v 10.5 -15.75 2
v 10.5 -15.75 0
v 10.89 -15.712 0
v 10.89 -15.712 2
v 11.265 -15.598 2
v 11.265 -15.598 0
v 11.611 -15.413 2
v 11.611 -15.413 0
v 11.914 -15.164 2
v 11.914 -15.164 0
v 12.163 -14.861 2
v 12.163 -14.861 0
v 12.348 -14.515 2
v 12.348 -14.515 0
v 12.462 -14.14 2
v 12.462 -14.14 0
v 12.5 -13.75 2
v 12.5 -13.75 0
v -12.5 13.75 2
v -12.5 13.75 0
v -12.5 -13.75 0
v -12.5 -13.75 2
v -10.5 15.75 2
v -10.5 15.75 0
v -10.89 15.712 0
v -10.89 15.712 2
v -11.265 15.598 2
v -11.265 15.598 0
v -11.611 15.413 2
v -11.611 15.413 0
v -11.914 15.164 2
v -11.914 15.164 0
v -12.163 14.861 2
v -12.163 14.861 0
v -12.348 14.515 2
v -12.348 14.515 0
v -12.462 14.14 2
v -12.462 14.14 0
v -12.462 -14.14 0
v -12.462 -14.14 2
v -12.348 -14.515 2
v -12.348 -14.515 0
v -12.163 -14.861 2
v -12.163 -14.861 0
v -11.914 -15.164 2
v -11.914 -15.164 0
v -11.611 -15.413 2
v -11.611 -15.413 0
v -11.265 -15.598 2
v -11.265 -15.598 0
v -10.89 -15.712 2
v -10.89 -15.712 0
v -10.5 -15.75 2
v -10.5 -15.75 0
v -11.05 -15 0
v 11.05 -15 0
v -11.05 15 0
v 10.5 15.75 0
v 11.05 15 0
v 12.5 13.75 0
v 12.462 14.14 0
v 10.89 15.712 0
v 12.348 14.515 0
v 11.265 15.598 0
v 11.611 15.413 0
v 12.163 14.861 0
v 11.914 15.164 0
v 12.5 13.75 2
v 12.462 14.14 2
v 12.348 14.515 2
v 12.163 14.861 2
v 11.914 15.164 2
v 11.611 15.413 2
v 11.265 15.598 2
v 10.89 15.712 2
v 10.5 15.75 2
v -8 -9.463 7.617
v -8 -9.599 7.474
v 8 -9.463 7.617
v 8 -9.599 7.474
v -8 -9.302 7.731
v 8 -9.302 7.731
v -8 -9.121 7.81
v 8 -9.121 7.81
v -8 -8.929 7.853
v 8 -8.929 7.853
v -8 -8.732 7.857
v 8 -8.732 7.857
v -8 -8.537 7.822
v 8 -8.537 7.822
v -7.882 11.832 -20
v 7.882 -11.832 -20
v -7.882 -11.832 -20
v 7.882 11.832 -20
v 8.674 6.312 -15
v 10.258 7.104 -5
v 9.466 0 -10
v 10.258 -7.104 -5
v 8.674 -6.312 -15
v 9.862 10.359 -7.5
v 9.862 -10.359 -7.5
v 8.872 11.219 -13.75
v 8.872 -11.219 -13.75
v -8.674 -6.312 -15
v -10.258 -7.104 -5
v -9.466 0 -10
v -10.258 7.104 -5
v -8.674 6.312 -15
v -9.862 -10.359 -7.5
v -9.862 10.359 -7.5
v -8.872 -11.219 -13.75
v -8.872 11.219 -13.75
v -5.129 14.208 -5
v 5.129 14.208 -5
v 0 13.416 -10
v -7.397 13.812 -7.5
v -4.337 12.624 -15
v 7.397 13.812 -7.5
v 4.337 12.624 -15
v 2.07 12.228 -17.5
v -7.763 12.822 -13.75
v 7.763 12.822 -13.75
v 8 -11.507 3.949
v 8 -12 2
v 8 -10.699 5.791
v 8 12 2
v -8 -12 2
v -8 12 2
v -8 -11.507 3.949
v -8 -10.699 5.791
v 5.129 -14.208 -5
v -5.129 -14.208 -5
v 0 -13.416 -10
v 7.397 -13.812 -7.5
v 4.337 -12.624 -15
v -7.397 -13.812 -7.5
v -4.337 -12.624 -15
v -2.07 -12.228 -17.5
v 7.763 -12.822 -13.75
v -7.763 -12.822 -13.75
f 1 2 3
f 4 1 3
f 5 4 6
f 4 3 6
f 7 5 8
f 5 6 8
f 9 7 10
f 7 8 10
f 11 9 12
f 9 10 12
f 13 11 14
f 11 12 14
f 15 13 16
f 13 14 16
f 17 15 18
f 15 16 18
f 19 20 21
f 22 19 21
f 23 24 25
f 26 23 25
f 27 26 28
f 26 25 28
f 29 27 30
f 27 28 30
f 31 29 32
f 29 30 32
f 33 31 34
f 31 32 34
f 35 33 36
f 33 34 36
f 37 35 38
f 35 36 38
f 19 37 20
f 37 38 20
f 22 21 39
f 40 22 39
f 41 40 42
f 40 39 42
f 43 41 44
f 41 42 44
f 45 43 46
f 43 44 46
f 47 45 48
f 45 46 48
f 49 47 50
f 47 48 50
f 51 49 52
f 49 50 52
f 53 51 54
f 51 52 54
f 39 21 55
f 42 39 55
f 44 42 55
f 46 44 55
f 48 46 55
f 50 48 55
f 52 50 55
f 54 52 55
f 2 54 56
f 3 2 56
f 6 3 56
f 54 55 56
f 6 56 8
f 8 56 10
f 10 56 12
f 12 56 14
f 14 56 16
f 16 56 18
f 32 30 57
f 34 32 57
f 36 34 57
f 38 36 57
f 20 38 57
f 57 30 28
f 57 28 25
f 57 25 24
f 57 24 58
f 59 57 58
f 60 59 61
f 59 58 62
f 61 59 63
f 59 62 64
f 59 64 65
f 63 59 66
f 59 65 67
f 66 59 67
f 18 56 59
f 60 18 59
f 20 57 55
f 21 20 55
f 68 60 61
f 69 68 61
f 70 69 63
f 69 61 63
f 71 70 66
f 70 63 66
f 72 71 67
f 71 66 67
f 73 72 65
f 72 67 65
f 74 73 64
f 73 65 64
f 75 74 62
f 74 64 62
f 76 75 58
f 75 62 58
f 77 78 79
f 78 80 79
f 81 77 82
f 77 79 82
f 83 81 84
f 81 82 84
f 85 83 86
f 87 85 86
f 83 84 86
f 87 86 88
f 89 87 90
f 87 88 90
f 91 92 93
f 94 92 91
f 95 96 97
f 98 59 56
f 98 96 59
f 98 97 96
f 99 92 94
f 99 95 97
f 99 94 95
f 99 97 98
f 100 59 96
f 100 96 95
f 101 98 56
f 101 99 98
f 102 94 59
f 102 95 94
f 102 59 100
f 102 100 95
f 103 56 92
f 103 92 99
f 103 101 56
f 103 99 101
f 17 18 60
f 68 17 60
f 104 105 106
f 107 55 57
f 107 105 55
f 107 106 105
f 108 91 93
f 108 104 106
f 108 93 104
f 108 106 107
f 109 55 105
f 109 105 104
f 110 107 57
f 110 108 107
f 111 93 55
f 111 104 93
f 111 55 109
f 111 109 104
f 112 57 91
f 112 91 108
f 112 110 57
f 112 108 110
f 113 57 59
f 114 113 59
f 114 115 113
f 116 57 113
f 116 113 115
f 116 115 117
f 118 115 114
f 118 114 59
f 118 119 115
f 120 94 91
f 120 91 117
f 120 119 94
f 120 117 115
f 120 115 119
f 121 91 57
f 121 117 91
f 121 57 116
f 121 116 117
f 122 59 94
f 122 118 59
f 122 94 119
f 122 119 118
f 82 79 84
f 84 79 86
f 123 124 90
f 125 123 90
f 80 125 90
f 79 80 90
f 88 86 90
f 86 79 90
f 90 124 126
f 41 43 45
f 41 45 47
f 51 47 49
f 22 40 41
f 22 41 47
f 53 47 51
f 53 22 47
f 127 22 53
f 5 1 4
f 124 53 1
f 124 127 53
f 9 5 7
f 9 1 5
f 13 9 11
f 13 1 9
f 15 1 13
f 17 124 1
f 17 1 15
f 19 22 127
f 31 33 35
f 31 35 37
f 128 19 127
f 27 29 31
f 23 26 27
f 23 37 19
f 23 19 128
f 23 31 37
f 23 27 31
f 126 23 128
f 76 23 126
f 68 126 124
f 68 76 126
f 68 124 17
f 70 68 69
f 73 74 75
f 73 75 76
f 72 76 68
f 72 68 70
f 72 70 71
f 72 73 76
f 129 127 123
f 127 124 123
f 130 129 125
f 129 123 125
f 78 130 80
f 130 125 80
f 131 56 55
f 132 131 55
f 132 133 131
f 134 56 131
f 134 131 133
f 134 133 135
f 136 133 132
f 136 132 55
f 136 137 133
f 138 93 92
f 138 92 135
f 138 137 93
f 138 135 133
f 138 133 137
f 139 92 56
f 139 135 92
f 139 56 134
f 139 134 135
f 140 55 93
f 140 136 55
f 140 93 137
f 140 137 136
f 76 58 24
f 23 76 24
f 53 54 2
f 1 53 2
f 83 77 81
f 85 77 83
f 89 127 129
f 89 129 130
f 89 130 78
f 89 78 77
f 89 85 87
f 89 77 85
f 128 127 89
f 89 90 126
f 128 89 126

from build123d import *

# Parameters (mm, degrees)
BOSS_EXTRUDE1_DEPTH = 2
BOSS_EXTRUDE2_DEPTH = 8
SKETCH3_W           = 22.1
SKETCH3_H           = 30
BOSS_EXTRUDE3_DEPTH = 20
BOSS_EXTRUDE3_TAPER = 9


with BuildPart() as part:
    # Sketch1 → Boss-Extrude1 (new body)
    with BuildSketch(Plane.XY):
        with BuildLine():
            Line((-10.5, -15.75), (10.5, -15.75))
            ThreePointArc((10.5, -15.75), (11.914213562, -15.164213562), (12.5, -13.75))
            Line((12.5, -13.75), (12.5, 13.75))
            ThreePointArc((12.5, 13.75), (11.914213562, 15.164213562), (10.5, 15.75))
            Line((10.5, 15.75), (-10.5, 15.75))
            ThreePointArc((-10.5, 15.75), (-11.914213562, 15.164213562), (-12.5, 13.75))
            Line((-12.5, 13.75), (-12.5, -13.75))
            ThreePointArc((-12.5, -13.75), (-11.914213562, -15.164213562), (-10.5, -15.75))
        make_face()
    extrude(amount=BOSS_EXTRUDE1_DEPTH)

    # Sketch2 → Boss-Extrude2 (add, symmetric)
    with BuildSketch(Plane(origin=(0, 0, 0), x_dir=(0, 0, -1), z_dir=(1, 0, 0))):
        with BuildLine():
            Line((-2, 12.000372018), (-2, -12.000372018))
            ThreePointArc((-2, -12.000372018), (-4.886867761, -11.141250022), (-7.474198634, -9.599233477))
            ThreePointArc((-7.474198634, -9.599233477), (-7.810172539, -9.12144706), (-7.821933208, -8.537477873))
            Line((-7.821933208, -8.537477873), (-2, 12.000372018))
        make_face()
    extrude(amount=BOSS_EXTRUDE2_DEPTH, both=True)

    # Sketch3 → Boss-Extrude3 (add)
    with BuildSketch(Plane(origin=(0, 0, 0), x_dir=(-1, 0, 0), z_dir=(0, 0, -1))):
        Rectangle(SKETCH3_W, SKETCH3_H)
    extrude(amount=BOSS_EXTRUDE3_DEPTH, taper=BOSS_EXTRUDE3_TAPER)


solid = part.part
